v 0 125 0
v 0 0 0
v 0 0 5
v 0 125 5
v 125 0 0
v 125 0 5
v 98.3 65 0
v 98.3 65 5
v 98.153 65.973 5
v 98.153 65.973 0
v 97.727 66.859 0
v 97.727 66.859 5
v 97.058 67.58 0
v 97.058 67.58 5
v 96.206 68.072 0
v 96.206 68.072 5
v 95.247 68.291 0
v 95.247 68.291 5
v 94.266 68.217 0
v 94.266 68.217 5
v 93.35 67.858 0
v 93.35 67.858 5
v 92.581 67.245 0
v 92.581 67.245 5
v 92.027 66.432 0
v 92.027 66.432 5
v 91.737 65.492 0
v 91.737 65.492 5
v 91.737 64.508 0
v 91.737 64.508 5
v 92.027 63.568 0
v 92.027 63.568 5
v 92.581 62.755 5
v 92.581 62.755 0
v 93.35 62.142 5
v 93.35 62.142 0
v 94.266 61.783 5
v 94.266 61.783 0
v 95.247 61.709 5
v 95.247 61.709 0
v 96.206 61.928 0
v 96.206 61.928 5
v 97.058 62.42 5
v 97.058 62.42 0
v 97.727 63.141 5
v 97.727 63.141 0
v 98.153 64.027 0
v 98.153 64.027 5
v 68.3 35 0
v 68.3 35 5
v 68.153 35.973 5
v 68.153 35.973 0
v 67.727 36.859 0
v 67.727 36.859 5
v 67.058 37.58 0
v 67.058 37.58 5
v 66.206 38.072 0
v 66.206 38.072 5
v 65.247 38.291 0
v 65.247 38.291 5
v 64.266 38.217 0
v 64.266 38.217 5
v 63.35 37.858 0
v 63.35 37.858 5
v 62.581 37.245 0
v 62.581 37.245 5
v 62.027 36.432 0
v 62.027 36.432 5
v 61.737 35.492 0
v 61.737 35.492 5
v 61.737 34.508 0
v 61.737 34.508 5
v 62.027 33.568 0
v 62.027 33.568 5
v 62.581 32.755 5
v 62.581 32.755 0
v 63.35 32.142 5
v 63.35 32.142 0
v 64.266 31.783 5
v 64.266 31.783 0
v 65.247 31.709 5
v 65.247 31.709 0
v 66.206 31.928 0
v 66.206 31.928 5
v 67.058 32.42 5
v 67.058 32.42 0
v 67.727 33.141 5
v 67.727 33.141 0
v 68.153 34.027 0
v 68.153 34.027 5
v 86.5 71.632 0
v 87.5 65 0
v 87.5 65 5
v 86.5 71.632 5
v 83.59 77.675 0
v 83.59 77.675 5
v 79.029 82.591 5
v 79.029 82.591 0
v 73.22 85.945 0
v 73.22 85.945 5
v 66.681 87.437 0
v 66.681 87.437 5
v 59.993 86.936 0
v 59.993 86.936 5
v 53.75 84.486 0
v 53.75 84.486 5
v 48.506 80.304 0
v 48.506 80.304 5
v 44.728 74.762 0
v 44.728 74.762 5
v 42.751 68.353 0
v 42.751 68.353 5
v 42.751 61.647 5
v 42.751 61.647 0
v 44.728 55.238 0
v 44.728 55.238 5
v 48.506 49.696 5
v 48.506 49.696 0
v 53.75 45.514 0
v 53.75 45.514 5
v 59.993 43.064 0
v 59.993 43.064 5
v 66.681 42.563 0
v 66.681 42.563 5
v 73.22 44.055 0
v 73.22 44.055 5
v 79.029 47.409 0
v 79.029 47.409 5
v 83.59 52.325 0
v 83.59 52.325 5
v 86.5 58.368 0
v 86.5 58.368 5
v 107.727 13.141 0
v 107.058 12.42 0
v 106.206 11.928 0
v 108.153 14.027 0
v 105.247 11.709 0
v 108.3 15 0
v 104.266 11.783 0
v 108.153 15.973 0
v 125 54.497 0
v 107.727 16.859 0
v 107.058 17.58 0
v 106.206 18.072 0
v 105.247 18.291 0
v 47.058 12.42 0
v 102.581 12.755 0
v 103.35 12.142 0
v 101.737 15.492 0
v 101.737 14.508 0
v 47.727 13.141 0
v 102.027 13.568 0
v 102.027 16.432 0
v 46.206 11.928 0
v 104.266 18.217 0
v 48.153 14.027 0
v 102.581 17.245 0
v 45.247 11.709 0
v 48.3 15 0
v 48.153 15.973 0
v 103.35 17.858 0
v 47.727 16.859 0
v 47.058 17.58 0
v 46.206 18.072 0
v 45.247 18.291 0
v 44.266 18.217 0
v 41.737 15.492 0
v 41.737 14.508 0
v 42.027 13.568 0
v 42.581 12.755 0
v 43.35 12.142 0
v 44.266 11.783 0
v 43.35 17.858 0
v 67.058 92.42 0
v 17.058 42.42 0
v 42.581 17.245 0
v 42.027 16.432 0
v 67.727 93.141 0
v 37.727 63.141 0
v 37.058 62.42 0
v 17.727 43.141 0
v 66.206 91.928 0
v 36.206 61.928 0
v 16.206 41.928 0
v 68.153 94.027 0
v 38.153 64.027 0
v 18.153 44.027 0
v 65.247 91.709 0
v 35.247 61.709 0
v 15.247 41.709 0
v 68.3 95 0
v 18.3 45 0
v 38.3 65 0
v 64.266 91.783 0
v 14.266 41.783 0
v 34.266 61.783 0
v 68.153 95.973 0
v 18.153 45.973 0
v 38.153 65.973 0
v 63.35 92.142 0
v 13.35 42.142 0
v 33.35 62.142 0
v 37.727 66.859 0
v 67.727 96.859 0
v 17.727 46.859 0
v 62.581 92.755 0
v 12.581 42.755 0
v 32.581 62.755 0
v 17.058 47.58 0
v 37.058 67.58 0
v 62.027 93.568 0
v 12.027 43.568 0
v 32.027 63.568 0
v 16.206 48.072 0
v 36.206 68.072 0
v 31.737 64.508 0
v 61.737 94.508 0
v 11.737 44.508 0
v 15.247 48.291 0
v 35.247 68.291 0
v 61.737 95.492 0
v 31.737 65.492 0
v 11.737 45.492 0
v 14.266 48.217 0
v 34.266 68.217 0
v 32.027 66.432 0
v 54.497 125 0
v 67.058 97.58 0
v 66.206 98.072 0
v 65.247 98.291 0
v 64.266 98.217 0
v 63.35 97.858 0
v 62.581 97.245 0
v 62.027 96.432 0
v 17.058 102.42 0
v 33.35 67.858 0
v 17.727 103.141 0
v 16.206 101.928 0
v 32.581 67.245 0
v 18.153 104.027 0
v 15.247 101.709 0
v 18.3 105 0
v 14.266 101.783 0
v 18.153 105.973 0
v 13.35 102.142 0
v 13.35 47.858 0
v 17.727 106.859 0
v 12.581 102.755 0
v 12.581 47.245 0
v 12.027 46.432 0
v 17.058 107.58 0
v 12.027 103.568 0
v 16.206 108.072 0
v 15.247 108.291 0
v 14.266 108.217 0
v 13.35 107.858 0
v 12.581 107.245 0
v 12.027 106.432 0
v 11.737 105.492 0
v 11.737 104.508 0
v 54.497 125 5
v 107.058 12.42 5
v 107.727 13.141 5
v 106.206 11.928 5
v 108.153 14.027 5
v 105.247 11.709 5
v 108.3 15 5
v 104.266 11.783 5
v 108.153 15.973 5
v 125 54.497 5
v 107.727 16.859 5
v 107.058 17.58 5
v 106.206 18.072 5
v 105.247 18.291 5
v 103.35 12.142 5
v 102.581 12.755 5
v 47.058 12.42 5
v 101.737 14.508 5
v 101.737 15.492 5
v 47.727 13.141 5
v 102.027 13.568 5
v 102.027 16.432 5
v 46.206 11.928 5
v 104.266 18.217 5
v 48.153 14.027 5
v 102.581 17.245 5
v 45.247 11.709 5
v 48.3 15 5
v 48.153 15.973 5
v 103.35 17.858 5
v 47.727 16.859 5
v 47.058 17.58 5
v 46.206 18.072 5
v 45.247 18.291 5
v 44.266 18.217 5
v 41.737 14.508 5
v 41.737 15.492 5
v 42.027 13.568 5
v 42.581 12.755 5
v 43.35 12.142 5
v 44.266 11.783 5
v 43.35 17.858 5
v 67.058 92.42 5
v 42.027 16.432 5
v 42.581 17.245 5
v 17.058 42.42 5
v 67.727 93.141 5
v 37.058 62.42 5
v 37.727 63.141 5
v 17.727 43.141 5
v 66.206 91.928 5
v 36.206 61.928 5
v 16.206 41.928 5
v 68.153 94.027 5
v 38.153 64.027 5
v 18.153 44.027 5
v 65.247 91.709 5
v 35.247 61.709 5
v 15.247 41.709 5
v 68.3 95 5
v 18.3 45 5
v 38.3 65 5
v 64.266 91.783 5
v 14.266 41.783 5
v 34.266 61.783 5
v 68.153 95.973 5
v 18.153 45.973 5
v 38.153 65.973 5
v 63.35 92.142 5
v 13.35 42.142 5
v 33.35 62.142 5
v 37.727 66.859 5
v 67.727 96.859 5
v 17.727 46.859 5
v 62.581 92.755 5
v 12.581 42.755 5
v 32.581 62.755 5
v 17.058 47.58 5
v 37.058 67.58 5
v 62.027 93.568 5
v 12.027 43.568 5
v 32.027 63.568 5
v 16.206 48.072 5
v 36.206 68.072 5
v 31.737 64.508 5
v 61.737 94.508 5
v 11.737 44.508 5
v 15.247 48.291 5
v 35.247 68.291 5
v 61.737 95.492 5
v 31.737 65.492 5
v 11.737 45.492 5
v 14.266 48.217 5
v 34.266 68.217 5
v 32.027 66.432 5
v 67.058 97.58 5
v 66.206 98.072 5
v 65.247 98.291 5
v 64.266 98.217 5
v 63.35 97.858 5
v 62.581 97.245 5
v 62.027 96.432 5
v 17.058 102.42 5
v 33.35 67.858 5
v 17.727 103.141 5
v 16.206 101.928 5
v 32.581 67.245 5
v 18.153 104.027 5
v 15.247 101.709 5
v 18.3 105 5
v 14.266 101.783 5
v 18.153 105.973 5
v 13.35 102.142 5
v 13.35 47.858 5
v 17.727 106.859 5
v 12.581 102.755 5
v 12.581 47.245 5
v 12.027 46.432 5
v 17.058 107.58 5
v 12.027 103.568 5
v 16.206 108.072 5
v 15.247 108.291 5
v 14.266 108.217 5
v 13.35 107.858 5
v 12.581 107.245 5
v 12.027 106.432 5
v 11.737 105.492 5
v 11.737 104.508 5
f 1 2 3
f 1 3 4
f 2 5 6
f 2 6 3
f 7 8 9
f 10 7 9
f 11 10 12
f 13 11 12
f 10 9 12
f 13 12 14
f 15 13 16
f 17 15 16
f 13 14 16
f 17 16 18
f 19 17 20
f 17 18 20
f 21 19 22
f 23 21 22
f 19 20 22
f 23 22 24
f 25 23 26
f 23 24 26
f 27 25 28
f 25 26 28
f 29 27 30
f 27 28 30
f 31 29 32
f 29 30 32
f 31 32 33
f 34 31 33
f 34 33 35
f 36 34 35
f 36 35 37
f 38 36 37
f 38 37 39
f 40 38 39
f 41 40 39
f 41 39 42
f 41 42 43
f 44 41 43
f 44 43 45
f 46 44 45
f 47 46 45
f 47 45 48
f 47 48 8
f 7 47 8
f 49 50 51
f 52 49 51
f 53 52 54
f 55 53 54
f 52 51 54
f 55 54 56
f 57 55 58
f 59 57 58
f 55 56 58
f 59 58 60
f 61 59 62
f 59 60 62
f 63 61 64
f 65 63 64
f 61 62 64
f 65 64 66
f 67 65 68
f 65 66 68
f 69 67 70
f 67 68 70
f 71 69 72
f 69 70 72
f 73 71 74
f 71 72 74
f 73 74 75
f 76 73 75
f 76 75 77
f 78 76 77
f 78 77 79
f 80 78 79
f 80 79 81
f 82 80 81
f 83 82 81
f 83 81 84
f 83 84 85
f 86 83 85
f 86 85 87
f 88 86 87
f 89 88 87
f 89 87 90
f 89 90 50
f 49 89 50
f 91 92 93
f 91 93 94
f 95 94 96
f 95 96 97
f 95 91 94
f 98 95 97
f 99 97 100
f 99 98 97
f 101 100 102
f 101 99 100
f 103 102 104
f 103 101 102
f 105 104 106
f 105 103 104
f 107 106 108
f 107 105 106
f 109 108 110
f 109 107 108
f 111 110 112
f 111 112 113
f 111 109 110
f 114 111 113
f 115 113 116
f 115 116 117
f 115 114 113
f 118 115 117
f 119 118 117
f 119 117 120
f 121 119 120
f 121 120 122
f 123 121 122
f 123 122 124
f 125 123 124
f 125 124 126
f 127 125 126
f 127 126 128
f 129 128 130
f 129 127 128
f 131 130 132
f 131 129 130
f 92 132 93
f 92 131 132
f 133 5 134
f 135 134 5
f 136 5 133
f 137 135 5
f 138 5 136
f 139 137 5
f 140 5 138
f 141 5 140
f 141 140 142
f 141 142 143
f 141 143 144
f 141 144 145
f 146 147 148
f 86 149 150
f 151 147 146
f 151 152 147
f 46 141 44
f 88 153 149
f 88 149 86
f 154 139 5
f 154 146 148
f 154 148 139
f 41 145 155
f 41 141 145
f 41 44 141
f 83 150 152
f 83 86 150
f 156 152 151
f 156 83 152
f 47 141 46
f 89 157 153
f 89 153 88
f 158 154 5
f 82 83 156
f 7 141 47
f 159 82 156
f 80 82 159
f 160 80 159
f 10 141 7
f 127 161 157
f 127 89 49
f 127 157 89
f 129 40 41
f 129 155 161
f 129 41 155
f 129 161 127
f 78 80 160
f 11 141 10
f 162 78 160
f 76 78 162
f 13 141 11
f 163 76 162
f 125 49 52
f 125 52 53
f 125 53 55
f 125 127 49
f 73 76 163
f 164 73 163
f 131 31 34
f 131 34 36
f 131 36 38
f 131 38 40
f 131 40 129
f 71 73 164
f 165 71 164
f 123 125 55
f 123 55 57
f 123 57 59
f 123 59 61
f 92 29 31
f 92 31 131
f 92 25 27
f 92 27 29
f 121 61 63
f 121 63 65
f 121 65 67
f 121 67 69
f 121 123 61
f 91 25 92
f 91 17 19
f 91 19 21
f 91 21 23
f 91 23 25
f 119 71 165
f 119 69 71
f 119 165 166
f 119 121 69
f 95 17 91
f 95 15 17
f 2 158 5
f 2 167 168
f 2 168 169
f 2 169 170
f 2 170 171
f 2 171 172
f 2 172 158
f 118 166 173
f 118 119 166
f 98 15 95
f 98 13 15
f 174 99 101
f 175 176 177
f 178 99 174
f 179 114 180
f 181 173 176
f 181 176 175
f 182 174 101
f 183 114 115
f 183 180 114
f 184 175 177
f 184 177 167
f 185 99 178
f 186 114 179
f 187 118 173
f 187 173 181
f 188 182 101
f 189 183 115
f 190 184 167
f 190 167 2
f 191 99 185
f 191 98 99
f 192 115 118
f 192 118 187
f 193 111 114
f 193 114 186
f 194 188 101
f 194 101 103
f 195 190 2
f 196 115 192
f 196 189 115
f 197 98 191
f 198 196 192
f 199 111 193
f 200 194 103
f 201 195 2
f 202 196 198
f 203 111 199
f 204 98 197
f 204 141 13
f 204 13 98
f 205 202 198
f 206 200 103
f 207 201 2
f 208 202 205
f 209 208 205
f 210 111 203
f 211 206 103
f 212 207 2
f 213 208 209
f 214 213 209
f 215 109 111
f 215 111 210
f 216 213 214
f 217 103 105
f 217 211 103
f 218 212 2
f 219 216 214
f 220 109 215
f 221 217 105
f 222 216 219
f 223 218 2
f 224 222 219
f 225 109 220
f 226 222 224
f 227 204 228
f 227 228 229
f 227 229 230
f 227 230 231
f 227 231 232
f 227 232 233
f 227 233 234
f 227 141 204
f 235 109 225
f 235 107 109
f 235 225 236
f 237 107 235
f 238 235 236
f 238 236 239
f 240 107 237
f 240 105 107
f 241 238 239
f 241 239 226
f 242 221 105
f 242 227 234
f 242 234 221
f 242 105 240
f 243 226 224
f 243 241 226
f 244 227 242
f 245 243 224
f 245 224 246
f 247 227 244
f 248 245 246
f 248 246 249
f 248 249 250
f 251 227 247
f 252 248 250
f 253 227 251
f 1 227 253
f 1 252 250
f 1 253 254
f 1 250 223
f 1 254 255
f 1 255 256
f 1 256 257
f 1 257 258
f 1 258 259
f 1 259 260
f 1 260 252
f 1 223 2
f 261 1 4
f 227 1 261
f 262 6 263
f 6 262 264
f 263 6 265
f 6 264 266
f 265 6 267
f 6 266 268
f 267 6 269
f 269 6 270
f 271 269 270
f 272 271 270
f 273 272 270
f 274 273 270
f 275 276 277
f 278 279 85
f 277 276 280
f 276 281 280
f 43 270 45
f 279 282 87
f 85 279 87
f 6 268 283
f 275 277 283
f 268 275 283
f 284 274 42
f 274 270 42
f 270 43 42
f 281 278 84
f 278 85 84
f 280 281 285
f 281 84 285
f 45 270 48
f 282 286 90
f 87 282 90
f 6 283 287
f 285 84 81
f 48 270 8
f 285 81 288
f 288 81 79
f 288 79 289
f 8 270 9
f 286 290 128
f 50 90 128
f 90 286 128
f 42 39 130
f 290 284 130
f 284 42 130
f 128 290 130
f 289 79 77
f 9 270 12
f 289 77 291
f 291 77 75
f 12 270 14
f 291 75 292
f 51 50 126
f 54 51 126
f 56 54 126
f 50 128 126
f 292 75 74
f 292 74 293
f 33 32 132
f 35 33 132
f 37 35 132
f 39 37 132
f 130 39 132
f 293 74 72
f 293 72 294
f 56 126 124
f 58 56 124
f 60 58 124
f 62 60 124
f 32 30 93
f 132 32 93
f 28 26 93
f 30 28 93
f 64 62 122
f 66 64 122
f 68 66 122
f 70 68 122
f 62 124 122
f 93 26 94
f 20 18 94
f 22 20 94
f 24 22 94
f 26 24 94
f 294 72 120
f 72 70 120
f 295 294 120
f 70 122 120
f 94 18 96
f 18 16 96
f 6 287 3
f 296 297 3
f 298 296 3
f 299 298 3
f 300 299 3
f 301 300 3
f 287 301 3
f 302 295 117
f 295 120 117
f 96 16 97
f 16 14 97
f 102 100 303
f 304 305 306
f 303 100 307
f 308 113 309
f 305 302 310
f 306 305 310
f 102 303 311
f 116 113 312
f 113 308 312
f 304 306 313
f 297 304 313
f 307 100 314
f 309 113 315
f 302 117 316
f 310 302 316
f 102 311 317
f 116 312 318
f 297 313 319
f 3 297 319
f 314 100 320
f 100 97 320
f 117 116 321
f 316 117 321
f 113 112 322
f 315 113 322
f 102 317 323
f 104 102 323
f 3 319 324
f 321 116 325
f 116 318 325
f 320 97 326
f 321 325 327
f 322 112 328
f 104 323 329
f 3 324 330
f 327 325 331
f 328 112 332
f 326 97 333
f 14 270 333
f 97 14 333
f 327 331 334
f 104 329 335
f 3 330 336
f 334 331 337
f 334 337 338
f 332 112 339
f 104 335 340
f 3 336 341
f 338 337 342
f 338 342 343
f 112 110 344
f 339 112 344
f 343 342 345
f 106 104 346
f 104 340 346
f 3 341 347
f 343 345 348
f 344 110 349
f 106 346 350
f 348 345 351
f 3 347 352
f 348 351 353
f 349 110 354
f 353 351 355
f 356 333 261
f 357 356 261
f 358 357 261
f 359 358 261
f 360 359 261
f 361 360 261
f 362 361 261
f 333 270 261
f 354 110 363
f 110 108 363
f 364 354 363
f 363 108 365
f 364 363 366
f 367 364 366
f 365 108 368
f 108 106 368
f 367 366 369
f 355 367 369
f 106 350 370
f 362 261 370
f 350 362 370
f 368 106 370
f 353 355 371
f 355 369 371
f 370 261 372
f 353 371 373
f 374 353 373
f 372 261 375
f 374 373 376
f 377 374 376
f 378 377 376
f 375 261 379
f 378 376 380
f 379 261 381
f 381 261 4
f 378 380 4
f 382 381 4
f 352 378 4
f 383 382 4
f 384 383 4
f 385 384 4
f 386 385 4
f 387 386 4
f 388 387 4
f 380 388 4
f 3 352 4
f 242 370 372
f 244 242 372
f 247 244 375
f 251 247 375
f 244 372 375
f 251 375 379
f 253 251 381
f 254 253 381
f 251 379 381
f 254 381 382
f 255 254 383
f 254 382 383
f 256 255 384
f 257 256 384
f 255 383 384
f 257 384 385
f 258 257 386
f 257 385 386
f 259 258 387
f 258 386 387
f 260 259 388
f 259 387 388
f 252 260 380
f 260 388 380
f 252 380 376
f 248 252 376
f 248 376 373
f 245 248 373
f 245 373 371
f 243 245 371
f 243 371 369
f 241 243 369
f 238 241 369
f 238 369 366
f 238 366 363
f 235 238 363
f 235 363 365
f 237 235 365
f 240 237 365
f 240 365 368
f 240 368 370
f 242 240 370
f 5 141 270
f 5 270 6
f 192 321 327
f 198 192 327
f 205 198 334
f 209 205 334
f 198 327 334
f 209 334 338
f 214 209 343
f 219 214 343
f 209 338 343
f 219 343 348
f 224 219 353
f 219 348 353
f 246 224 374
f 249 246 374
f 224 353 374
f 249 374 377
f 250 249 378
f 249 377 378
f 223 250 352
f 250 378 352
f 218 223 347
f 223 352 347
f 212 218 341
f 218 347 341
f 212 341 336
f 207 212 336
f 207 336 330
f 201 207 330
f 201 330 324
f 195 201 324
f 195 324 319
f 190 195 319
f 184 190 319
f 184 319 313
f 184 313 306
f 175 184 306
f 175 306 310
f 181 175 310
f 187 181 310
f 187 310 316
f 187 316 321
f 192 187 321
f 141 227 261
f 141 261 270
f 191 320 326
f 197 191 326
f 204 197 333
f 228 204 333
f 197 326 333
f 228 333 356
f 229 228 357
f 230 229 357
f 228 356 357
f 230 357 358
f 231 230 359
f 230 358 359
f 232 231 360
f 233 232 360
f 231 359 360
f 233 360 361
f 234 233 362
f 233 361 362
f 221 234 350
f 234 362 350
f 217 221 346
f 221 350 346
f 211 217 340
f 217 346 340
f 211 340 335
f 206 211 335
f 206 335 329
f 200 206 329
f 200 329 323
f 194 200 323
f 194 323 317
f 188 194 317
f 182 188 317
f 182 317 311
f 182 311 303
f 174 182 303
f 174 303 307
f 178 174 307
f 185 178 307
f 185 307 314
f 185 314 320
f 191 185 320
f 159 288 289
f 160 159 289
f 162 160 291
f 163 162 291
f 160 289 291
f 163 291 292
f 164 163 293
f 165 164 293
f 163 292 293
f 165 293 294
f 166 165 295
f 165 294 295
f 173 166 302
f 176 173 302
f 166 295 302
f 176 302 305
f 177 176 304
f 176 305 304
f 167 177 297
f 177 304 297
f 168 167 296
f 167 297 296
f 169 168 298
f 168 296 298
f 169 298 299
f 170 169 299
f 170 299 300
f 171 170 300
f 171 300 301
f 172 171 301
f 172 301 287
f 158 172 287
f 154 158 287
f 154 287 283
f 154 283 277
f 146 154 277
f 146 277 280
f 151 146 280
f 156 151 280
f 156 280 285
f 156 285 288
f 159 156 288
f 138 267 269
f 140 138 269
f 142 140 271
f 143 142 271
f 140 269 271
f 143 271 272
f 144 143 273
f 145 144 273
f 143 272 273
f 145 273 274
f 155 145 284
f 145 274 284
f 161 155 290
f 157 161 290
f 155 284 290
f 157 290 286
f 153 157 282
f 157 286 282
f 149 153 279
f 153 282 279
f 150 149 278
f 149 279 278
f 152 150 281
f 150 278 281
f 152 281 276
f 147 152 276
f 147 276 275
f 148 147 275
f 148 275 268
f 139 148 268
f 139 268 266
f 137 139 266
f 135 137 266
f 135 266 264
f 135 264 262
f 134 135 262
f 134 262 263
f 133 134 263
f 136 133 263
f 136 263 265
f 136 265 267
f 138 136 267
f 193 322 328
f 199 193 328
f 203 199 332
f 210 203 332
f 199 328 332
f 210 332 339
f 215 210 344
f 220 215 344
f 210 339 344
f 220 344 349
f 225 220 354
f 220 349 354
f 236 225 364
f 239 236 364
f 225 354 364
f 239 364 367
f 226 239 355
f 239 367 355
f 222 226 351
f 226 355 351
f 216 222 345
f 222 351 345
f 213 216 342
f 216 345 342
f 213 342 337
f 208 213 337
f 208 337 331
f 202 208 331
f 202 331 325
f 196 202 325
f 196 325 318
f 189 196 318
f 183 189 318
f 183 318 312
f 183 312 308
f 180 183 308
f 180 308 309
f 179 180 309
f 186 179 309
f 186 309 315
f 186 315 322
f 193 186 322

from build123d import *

# Parameters (mm, degrees)
SKETCH_1_R            = 22.5
EXTRUDE_1_DEPTH       = 5
HOLE_WIZARD_M61_D     = 6.6
HOLE_WIZARD_M61_DEPTH = 10
HOLE_WIZARD_M61_TIP   = 1.982840043


with BuildPart() as part:
    # Эскиз1 → Бобышка-Вытянуть1 (new body)
    with BuildSketch(Plane.XY):
        Polygon((0, 0), (0, 125), (54.497474683, 125), (125, 54.497474683), (125, 0), align=None)
        with Locations((65, 65)):
            Circle(SKETCH_1_R, mode=Mode.SUBTRACT)
    extrude(amount=EXTRUDE_1_DEPTH)

    # Отверстие с зазором M61
    with Locations(Plane(origin=(0, 0, 0), x_dir=(-1, 0, 0), z_dir=(0, 0, -1))):
        with Locations((-95, 65), (-65, 95), (-35, 65), (-65, 35), (-105, 15), (-45, 15), (-15, 45), (-15, 105)):
            Hole(HOLE_WIZARD_M61_D / 2, depth=HOLE_WIZARD_M61_DEPTH)
            with Locations((0, 0, -(HOLE_WIZARD_M61_DEPTH + HOLE_WIZARD_M61_TIP / 2))):  # 118° drill point
                Cone(0, HOLE_WIZARD_M61_D / 2, HOLE_WIZARD_M61_TIP, mode=Mode.SUBTRACT)


solid = part.part
